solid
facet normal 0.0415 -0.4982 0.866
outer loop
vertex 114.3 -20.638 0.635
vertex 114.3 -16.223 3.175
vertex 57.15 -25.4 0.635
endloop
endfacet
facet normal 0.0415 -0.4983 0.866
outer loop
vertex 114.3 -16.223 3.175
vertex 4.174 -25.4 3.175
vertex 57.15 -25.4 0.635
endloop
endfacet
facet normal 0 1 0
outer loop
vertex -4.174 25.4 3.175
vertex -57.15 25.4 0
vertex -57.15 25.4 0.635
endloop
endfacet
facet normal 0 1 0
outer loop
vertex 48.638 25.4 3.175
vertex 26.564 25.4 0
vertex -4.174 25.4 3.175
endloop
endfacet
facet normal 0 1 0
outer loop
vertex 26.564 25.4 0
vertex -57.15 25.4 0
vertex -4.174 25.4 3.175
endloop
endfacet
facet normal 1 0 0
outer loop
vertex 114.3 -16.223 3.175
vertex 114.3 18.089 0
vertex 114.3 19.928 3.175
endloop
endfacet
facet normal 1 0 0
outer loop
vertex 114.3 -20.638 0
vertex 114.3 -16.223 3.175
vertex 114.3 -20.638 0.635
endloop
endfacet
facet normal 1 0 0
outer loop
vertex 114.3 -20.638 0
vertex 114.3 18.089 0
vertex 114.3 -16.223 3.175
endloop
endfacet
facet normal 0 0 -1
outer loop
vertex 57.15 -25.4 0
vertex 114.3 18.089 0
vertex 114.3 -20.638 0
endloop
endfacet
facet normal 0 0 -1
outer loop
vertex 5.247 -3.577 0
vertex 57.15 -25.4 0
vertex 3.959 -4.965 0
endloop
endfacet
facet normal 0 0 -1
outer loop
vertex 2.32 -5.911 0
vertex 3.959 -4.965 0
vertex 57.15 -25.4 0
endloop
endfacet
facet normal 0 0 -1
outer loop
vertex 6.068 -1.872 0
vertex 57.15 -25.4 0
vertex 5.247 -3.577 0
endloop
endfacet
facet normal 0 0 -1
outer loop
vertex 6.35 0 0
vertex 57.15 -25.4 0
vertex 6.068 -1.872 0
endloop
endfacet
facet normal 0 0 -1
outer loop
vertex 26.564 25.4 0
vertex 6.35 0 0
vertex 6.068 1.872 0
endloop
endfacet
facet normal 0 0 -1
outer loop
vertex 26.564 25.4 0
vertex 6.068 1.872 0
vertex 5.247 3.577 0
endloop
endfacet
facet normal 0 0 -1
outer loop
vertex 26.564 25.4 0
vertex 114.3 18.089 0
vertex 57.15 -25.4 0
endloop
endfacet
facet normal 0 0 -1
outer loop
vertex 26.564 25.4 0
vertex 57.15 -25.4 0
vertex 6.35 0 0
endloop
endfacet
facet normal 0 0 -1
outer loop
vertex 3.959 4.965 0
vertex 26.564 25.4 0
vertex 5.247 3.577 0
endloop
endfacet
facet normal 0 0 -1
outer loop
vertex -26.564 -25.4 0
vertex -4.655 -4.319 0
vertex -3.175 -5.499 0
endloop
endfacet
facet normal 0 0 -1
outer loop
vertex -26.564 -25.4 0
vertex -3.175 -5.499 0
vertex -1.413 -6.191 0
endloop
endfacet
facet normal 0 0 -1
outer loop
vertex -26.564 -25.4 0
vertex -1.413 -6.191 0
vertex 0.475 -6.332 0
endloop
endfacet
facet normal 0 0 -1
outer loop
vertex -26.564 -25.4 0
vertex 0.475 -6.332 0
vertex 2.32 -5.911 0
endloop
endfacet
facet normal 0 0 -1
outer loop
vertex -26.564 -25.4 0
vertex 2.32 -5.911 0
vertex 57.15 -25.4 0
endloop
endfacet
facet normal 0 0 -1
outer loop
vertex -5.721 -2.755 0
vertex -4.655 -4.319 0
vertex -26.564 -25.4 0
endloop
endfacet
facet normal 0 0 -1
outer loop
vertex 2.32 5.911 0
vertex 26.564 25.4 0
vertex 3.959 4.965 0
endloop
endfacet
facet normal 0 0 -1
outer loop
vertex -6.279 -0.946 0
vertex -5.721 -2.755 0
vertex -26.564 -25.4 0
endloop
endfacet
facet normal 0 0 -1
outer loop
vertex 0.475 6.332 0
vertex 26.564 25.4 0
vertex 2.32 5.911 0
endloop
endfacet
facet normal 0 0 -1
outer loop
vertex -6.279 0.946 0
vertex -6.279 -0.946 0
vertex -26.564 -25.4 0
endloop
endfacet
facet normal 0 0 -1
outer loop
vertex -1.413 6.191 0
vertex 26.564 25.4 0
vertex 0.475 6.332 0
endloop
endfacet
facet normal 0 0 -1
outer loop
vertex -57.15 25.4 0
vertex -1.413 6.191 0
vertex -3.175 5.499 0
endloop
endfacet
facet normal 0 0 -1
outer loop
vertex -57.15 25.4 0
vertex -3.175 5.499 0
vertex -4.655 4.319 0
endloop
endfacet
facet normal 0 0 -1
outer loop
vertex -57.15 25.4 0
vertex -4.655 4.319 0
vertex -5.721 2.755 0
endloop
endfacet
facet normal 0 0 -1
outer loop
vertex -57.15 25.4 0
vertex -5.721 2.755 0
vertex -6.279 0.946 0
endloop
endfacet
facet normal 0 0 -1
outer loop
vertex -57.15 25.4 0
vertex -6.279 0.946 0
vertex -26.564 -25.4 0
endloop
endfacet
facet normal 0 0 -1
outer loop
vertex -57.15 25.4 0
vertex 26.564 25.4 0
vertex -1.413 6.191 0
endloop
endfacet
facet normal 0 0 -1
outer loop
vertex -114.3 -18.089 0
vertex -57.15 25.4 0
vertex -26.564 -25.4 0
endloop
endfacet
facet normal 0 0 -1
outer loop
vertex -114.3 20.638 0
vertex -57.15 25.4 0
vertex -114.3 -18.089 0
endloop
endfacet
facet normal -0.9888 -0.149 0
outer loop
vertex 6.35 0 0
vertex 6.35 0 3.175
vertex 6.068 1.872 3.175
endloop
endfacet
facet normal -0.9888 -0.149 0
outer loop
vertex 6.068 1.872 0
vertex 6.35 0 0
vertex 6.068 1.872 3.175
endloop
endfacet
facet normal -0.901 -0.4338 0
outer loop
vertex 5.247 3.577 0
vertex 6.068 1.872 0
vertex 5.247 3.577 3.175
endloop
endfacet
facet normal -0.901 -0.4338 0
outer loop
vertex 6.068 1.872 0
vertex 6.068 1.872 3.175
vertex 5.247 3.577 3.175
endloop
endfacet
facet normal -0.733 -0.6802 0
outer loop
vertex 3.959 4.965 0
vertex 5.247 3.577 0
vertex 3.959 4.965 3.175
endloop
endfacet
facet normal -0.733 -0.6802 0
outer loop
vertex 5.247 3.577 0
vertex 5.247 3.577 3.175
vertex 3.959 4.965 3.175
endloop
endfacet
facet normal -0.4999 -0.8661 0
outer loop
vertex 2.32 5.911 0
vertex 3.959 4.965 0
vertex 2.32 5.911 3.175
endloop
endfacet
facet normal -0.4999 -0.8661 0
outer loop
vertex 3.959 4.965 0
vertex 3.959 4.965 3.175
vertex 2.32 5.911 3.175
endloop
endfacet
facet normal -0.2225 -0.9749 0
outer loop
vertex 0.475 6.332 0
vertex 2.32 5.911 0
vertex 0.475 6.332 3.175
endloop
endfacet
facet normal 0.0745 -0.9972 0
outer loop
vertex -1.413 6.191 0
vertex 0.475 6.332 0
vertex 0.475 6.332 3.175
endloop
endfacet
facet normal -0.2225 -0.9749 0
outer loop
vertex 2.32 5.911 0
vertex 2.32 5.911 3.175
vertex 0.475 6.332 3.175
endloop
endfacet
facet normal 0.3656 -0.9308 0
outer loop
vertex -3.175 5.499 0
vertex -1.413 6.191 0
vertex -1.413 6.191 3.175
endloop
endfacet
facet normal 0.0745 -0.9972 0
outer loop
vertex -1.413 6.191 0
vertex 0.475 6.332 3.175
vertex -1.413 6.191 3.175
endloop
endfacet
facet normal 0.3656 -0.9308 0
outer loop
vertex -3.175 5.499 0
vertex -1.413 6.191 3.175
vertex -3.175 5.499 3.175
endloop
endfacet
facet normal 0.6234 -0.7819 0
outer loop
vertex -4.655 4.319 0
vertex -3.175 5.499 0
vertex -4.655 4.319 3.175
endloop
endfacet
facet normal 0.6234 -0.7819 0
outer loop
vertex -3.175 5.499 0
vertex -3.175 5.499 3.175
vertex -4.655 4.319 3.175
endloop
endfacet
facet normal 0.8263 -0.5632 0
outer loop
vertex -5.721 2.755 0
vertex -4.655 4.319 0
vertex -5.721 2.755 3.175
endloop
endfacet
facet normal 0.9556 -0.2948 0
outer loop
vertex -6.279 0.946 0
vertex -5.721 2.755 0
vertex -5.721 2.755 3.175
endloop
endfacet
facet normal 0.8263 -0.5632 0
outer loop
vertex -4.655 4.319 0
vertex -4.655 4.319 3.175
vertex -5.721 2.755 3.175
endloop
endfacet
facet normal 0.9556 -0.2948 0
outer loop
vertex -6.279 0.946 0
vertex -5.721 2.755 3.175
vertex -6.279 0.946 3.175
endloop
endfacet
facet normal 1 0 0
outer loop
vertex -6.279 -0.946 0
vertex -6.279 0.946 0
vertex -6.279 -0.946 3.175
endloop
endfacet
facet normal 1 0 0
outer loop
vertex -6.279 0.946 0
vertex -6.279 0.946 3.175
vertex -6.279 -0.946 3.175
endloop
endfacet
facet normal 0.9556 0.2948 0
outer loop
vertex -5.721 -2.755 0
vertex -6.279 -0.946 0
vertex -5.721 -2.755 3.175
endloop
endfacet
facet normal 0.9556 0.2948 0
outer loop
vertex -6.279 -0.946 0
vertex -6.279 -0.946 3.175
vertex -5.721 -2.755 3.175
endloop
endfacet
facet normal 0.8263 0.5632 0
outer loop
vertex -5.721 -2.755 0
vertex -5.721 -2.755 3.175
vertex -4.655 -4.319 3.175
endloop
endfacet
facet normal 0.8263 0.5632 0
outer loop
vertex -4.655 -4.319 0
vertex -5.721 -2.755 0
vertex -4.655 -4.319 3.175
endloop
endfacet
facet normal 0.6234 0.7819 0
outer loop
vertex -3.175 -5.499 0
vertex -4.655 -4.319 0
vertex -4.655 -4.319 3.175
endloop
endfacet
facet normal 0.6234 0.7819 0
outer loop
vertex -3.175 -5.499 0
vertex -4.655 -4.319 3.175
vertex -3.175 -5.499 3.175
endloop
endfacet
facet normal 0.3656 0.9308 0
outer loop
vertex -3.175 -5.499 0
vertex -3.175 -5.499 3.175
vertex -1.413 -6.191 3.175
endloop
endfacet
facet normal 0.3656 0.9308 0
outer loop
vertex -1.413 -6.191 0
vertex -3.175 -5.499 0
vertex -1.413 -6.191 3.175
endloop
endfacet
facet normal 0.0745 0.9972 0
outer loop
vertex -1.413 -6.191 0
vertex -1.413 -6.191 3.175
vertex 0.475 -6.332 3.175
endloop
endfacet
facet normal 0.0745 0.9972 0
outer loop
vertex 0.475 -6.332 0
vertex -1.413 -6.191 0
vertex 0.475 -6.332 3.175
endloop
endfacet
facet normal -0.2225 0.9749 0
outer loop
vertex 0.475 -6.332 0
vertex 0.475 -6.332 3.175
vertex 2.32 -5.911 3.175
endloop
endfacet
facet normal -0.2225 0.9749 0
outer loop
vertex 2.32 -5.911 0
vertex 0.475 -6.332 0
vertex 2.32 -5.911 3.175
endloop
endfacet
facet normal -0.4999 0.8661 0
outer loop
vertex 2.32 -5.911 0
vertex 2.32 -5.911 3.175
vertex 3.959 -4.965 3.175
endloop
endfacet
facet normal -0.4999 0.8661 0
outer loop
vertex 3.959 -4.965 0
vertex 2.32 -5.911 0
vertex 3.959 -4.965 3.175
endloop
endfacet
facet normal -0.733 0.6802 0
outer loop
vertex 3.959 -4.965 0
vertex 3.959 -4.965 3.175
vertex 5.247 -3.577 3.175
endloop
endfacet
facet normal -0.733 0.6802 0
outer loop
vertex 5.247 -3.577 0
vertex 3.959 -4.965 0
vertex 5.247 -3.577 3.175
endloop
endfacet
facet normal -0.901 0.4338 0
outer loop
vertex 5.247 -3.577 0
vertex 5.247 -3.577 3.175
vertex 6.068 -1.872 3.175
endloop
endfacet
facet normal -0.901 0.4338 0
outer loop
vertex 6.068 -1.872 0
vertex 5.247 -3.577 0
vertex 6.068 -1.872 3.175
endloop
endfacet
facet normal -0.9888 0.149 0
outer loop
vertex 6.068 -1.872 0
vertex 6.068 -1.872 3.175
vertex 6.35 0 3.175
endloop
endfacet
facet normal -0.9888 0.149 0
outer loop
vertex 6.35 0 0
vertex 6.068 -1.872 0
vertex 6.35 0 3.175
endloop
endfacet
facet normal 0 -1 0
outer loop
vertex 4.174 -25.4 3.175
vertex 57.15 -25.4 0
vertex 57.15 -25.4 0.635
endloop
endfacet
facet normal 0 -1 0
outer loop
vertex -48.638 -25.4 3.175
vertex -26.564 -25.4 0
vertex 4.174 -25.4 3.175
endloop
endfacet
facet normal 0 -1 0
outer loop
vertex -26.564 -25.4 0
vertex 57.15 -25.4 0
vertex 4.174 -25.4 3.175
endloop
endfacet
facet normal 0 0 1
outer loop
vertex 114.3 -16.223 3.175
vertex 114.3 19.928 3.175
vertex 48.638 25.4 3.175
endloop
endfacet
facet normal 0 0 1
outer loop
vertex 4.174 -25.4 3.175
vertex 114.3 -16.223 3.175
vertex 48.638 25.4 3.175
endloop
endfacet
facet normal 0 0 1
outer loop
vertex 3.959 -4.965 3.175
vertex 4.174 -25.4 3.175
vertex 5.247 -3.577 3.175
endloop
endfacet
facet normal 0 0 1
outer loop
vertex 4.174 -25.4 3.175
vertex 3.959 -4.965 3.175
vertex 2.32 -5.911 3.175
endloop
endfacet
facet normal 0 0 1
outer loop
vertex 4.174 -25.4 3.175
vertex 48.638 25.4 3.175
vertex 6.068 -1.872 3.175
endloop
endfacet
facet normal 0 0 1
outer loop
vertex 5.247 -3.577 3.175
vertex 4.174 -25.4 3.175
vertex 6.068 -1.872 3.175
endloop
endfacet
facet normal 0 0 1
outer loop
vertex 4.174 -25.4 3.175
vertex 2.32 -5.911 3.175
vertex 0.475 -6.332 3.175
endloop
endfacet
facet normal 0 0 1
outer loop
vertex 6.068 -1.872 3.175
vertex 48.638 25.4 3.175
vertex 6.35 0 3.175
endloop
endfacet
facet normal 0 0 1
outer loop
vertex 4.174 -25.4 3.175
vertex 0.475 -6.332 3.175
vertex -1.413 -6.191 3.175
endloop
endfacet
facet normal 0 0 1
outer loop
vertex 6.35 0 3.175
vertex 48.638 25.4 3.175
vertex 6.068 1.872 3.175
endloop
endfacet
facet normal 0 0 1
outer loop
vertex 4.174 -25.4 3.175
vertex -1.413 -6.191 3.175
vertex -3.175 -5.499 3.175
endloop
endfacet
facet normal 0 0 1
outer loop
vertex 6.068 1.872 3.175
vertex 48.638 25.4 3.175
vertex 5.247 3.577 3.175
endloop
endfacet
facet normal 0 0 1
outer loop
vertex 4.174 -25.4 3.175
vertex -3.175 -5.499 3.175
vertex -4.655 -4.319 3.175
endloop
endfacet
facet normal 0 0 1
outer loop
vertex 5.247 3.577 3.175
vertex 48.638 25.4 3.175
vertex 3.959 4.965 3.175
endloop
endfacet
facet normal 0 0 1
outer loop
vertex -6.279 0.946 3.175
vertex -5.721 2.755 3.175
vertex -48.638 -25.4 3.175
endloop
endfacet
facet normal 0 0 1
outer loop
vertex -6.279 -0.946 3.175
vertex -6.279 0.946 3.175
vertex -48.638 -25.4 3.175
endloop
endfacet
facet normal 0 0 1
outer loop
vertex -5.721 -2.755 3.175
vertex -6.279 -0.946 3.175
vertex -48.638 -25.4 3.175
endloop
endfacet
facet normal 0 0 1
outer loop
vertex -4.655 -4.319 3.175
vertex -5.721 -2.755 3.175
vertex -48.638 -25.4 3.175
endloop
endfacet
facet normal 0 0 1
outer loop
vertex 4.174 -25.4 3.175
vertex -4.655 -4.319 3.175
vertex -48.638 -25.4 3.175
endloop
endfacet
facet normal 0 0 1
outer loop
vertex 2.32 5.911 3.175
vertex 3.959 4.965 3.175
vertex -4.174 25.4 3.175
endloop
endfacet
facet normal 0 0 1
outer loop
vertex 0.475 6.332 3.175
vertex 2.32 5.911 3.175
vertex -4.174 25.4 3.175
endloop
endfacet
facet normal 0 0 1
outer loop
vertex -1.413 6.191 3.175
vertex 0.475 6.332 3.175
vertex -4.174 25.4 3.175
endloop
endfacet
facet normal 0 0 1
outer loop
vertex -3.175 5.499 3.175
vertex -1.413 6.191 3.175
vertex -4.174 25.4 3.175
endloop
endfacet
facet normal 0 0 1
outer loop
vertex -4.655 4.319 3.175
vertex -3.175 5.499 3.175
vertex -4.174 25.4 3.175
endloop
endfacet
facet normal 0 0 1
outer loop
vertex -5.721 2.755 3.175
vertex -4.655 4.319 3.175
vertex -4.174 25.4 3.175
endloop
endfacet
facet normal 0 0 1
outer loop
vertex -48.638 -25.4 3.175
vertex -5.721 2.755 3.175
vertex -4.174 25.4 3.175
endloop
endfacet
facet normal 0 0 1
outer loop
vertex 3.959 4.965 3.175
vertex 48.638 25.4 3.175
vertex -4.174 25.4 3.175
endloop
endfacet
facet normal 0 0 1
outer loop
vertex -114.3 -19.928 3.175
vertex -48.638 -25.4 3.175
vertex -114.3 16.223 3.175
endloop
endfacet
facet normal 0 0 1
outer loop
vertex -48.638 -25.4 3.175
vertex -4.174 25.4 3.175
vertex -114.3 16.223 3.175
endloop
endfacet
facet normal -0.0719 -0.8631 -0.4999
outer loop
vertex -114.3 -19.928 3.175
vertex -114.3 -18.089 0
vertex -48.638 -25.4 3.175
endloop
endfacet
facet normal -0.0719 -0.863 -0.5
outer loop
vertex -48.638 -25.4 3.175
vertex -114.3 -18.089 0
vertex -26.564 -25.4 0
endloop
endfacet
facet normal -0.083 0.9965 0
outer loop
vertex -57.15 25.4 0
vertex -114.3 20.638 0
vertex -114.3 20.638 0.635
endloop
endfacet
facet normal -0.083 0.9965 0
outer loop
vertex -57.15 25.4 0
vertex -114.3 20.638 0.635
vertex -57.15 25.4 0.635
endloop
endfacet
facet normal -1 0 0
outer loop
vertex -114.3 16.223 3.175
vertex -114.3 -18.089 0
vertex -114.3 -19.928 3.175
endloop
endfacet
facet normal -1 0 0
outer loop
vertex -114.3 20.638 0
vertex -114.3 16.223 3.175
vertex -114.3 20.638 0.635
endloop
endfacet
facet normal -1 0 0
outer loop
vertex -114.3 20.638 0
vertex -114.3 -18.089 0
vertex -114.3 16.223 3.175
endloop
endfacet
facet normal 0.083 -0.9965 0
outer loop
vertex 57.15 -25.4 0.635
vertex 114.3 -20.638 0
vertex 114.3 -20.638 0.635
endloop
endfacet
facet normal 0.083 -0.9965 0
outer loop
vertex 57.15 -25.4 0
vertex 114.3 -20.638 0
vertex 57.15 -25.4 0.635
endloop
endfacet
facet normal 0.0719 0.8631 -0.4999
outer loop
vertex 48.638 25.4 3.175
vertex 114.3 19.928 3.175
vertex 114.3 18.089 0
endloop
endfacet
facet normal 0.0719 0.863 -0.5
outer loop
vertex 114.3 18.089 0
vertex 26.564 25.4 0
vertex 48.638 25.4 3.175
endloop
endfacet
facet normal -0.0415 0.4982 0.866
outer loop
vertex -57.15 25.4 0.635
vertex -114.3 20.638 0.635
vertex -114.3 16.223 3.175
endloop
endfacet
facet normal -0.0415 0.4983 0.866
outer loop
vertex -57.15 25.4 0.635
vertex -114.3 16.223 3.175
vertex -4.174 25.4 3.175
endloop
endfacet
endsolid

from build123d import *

# Parameters (mm, degrees)
BOSS_EXTRUDE1_DEPTH = 3.175
SKETCH2_R           = 6.35
CUT_EXTRUDE1_DEPTH  = 118.131253835
CHAMFER1_SIZE       = 4.399409051
CHAMFER1_SIZE_2     = 2.54


with BuildPart() as part:
    # Sketch1 → Boss-Extrude1 (new body)
    with BuildSketch(Plane.XY):
        Polygon((-57.15, 25.4), (57.15, 25.4), (114.3, 20.6375), (114.3, -20.6375), (57.15, -25.4), (-57.15, -25.4), (-114.3, -20.6375), (-114.3, 20.6375), align=None)
    extrude(amount=BOSS_EXTRUDE1_DEPTH)

    # Sketch2 → Cut-Extrude1 (cut, through all)
    with BuildSketch(Plane.XY.offset(3.175)):
        Circle(SKETCH2_R)
    extrude(amount=-CUT_EXTRUDE1_DEPTH, mode=Mode.SUBTRACT)

    # Chamfer1
    # the kernel refuses this chamfer: 4.399409051, 2.54 mm, written as the material it takes off along each edge
    with BuildSketch(Plane(origin=(23.12299944, 28.23558338, 0), x_dir=(0, 0, 1), z_dir=(0.9965457582448797, -0.0830454798537405, 0))) as chamfer1_piece_1:
        Polygon((CHAMFER1_SIZE, 0), (0, CHAMFER1_SIZE_2), (0, 0), align=None)
    extrude(amount=102.874688123, mode=Mode.SUBTRACT)
    with BuildSketch(Plane(origin=(-23.12299944, -28.23558338, 0), x_dir=(0.0830454798537407, 0.9965457582448796, 0), z_dir=(-0.9965457582448797, 0.08304547985374071, 0))) as chamfer1_piece_2:
        Polygon((CHAMFER1_SIZE_2, 0), (0, -CHAMFER1_SIZE), (0, 0), align=None)
    extrude(amount=102.874688123, mode=Mode.SUBTRACT)
    with BuildSketch(Plane(origin=(-125.64233352, 19.69230554, 3.175), x_dir=(0, 0, -1), z_dir=(0.9965457582448797, 0.08304547985374024, 0))) as chamfer1_piece_3:
        Polygon((CHAMFER1_SIZE_2, 0), (0, -CHAMFER1_SIZE), (0, 0), align=None)
    extrude(amount=125.637985093, mode=Mode.SUBTRACT)
    with BuildSketch(Plane(origin=(125.64233352, -19.69230554, 3.175), x_dir=(-0.08304547985374047, 0.9965457582448795, 0), z_dir=(-0.9965457582448797, -0.0830454798537405, 0))) as chamfer1_piece_4:
        Polygon((CHAMFER1_SIZE, 0), (0, CHAMFER1_SIZE_2), (0, 0), align=None)
    extrude(amount=125.637985093, mode=Mode.SUBTRACT)


solid = part.part
